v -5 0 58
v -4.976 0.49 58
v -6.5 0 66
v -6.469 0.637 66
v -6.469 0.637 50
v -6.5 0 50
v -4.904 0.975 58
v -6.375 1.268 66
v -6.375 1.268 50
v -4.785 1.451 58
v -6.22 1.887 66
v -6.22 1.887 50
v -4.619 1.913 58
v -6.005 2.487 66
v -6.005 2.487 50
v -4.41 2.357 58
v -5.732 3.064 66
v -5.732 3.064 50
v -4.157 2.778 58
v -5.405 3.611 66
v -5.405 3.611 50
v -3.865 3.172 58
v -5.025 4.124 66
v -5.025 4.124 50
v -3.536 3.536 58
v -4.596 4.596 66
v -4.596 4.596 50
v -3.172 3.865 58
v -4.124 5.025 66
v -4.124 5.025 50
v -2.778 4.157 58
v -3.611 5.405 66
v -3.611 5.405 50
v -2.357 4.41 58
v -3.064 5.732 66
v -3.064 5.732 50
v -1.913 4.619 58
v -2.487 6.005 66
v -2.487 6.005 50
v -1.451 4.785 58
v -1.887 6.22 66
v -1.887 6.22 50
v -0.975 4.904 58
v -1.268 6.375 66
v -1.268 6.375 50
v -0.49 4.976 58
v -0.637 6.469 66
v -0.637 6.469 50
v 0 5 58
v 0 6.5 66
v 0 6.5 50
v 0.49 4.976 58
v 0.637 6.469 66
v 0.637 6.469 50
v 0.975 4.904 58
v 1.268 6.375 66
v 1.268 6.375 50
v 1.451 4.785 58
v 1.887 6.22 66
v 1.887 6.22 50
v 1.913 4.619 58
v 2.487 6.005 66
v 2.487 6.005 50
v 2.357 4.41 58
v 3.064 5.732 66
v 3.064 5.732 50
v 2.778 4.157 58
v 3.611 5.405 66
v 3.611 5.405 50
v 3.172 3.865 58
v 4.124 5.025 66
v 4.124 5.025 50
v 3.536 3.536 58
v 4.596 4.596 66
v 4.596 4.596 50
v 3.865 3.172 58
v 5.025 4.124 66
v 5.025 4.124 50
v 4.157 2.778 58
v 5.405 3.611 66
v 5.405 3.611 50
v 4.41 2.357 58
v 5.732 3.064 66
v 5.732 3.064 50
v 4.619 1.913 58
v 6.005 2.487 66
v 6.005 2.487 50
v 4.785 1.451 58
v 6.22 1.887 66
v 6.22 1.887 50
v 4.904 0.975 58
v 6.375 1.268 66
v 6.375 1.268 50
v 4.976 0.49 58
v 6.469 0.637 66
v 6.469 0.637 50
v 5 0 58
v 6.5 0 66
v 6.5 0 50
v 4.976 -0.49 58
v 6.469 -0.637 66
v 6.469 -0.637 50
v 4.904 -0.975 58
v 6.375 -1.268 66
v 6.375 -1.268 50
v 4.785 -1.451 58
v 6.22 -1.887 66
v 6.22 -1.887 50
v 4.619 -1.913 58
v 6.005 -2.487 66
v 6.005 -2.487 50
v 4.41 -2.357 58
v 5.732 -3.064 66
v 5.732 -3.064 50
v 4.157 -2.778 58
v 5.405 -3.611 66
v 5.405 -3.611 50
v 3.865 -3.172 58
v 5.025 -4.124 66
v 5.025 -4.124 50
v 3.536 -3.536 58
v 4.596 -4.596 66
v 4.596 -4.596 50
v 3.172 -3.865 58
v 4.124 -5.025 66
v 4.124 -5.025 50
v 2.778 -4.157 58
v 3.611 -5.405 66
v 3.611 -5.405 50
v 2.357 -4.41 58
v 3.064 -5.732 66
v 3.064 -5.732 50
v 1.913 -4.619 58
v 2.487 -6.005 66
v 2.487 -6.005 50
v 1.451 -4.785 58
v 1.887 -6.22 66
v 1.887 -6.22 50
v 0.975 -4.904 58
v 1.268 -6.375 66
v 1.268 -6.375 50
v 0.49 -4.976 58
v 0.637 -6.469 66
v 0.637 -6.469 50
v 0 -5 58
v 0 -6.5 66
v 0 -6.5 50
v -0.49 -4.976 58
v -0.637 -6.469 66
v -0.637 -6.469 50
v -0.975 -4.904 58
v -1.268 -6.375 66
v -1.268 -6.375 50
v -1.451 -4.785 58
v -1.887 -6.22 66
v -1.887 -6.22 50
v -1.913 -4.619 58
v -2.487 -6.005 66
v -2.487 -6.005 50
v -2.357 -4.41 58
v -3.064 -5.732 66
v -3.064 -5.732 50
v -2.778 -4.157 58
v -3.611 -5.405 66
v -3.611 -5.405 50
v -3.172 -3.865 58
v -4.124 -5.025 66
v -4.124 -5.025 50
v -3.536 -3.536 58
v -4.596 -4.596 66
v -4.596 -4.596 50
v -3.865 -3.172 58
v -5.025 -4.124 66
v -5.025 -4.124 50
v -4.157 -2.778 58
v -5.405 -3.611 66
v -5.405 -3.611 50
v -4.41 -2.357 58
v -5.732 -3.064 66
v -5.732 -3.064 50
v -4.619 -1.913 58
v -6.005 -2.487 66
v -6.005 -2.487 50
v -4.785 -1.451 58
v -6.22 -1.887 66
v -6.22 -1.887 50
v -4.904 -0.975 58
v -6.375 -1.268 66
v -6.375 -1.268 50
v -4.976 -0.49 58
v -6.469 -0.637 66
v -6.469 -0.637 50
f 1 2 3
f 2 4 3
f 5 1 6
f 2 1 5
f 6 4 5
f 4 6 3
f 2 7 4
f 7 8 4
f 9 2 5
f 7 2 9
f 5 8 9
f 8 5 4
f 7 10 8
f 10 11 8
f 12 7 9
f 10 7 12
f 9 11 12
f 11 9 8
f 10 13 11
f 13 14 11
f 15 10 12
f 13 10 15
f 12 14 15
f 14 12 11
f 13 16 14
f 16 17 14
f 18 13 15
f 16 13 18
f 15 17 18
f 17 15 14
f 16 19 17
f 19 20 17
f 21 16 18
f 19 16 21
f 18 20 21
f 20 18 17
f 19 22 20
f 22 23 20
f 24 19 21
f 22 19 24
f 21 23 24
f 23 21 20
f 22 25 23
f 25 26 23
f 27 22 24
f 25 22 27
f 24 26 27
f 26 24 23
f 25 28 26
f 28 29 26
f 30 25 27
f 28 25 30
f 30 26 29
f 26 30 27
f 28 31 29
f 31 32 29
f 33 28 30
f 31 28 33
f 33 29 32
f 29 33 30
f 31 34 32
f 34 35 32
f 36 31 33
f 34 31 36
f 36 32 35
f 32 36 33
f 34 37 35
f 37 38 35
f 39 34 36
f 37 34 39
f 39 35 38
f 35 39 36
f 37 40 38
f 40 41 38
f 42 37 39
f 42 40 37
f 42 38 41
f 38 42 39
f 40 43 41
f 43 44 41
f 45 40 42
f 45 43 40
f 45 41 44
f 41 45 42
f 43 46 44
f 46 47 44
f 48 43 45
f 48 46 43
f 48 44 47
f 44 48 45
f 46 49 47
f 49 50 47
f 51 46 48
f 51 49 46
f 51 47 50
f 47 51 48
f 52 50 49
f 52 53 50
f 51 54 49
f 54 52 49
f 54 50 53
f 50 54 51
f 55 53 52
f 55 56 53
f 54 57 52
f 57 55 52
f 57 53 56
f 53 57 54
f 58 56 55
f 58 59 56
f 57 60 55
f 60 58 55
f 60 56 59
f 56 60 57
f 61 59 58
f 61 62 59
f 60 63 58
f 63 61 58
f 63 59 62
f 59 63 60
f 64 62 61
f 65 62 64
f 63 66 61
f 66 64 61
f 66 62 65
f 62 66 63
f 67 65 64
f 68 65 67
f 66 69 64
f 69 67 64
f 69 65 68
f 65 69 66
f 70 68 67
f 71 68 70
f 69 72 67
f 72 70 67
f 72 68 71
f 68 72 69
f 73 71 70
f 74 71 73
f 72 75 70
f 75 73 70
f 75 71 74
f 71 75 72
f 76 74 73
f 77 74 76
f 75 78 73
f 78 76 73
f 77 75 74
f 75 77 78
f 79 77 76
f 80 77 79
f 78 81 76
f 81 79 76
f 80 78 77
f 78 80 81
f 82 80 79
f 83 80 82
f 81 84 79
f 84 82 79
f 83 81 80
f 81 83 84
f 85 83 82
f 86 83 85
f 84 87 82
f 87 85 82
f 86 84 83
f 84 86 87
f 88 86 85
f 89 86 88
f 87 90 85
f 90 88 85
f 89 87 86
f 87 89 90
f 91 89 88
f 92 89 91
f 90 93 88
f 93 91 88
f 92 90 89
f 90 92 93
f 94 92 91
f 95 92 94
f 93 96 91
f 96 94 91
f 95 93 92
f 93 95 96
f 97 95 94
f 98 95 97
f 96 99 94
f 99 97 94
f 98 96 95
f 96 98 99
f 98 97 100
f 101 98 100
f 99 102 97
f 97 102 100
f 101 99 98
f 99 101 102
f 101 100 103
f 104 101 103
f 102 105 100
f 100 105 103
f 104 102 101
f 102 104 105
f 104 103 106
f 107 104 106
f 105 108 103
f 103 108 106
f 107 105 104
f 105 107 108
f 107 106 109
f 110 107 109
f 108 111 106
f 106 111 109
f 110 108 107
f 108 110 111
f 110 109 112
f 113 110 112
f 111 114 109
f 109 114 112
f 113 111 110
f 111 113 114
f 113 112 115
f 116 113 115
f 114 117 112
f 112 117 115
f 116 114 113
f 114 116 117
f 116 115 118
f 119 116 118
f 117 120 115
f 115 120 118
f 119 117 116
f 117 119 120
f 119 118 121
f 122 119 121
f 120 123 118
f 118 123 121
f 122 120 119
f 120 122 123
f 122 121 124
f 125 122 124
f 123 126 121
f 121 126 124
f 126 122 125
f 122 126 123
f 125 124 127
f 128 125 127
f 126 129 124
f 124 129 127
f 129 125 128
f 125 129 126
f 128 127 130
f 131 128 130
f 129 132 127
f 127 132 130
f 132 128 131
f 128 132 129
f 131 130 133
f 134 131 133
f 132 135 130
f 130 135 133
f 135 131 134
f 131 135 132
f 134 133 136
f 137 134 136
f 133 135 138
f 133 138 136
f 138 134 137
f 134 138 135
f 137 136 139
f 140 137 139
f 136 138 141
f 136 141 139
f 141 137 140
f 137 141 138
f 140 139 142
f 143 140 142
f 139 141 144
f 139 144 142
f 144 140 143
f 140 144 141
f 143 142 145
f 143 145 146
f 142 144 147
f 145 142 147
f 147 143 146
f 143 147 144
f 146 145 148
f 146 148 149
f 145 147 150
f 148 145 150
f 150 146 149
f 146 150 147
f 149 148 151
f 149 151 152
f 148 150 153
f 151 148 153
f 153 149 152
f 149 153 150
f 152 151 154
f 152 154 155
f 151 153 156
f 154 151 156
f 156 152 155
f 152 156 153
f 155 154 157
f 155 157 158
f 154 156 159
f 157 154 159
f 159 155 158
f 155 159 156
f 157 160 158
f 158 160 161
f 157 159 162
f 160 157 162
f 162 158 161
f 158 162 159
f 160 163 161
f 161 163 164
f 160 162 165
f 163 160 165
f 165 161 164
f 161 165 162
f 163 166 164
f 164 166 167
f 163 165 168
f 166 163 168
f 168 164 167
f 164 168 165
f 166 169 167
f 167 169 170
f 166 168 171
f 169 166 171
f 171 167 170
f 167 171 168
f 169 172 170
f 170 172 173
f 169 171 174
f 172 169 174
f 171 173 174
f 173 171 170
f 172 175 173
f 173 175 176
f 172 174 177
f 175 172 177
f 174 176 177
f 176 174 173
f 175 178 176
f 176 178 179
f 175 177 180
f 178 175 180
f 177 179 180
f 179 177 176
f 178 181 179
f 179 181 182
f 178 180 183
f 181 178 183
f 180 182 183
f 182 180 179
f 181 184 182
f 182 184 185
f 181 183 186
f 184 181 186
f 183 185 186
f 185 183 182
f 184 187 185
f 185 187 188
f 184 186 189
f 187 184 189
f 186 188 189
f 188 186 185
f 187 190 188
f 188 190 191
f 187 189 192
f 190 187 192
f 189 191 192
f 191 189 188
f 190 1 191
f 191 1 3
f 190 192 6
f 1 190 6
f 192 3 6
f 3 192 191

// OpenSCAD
// Built by bench/smallmodels/features/compiler.py from a list of features.
$fn = 64;
difference() {
  union() {
    translate([0, 0, 0]) rotate_extrude() polygon([[9, 0], [7.5, 10], [9.5, 20], [7.5, 30]]);
    translate([0, 0, 25]) rotate_extrude() polygon([[6.5, 25], [5, 33], [6.5, 41]]);
  }
  union() {
    translate([0, 0, -1]) rotate([0, 0, 0]) cylinder(d = 3, h = 68);
  }
}
